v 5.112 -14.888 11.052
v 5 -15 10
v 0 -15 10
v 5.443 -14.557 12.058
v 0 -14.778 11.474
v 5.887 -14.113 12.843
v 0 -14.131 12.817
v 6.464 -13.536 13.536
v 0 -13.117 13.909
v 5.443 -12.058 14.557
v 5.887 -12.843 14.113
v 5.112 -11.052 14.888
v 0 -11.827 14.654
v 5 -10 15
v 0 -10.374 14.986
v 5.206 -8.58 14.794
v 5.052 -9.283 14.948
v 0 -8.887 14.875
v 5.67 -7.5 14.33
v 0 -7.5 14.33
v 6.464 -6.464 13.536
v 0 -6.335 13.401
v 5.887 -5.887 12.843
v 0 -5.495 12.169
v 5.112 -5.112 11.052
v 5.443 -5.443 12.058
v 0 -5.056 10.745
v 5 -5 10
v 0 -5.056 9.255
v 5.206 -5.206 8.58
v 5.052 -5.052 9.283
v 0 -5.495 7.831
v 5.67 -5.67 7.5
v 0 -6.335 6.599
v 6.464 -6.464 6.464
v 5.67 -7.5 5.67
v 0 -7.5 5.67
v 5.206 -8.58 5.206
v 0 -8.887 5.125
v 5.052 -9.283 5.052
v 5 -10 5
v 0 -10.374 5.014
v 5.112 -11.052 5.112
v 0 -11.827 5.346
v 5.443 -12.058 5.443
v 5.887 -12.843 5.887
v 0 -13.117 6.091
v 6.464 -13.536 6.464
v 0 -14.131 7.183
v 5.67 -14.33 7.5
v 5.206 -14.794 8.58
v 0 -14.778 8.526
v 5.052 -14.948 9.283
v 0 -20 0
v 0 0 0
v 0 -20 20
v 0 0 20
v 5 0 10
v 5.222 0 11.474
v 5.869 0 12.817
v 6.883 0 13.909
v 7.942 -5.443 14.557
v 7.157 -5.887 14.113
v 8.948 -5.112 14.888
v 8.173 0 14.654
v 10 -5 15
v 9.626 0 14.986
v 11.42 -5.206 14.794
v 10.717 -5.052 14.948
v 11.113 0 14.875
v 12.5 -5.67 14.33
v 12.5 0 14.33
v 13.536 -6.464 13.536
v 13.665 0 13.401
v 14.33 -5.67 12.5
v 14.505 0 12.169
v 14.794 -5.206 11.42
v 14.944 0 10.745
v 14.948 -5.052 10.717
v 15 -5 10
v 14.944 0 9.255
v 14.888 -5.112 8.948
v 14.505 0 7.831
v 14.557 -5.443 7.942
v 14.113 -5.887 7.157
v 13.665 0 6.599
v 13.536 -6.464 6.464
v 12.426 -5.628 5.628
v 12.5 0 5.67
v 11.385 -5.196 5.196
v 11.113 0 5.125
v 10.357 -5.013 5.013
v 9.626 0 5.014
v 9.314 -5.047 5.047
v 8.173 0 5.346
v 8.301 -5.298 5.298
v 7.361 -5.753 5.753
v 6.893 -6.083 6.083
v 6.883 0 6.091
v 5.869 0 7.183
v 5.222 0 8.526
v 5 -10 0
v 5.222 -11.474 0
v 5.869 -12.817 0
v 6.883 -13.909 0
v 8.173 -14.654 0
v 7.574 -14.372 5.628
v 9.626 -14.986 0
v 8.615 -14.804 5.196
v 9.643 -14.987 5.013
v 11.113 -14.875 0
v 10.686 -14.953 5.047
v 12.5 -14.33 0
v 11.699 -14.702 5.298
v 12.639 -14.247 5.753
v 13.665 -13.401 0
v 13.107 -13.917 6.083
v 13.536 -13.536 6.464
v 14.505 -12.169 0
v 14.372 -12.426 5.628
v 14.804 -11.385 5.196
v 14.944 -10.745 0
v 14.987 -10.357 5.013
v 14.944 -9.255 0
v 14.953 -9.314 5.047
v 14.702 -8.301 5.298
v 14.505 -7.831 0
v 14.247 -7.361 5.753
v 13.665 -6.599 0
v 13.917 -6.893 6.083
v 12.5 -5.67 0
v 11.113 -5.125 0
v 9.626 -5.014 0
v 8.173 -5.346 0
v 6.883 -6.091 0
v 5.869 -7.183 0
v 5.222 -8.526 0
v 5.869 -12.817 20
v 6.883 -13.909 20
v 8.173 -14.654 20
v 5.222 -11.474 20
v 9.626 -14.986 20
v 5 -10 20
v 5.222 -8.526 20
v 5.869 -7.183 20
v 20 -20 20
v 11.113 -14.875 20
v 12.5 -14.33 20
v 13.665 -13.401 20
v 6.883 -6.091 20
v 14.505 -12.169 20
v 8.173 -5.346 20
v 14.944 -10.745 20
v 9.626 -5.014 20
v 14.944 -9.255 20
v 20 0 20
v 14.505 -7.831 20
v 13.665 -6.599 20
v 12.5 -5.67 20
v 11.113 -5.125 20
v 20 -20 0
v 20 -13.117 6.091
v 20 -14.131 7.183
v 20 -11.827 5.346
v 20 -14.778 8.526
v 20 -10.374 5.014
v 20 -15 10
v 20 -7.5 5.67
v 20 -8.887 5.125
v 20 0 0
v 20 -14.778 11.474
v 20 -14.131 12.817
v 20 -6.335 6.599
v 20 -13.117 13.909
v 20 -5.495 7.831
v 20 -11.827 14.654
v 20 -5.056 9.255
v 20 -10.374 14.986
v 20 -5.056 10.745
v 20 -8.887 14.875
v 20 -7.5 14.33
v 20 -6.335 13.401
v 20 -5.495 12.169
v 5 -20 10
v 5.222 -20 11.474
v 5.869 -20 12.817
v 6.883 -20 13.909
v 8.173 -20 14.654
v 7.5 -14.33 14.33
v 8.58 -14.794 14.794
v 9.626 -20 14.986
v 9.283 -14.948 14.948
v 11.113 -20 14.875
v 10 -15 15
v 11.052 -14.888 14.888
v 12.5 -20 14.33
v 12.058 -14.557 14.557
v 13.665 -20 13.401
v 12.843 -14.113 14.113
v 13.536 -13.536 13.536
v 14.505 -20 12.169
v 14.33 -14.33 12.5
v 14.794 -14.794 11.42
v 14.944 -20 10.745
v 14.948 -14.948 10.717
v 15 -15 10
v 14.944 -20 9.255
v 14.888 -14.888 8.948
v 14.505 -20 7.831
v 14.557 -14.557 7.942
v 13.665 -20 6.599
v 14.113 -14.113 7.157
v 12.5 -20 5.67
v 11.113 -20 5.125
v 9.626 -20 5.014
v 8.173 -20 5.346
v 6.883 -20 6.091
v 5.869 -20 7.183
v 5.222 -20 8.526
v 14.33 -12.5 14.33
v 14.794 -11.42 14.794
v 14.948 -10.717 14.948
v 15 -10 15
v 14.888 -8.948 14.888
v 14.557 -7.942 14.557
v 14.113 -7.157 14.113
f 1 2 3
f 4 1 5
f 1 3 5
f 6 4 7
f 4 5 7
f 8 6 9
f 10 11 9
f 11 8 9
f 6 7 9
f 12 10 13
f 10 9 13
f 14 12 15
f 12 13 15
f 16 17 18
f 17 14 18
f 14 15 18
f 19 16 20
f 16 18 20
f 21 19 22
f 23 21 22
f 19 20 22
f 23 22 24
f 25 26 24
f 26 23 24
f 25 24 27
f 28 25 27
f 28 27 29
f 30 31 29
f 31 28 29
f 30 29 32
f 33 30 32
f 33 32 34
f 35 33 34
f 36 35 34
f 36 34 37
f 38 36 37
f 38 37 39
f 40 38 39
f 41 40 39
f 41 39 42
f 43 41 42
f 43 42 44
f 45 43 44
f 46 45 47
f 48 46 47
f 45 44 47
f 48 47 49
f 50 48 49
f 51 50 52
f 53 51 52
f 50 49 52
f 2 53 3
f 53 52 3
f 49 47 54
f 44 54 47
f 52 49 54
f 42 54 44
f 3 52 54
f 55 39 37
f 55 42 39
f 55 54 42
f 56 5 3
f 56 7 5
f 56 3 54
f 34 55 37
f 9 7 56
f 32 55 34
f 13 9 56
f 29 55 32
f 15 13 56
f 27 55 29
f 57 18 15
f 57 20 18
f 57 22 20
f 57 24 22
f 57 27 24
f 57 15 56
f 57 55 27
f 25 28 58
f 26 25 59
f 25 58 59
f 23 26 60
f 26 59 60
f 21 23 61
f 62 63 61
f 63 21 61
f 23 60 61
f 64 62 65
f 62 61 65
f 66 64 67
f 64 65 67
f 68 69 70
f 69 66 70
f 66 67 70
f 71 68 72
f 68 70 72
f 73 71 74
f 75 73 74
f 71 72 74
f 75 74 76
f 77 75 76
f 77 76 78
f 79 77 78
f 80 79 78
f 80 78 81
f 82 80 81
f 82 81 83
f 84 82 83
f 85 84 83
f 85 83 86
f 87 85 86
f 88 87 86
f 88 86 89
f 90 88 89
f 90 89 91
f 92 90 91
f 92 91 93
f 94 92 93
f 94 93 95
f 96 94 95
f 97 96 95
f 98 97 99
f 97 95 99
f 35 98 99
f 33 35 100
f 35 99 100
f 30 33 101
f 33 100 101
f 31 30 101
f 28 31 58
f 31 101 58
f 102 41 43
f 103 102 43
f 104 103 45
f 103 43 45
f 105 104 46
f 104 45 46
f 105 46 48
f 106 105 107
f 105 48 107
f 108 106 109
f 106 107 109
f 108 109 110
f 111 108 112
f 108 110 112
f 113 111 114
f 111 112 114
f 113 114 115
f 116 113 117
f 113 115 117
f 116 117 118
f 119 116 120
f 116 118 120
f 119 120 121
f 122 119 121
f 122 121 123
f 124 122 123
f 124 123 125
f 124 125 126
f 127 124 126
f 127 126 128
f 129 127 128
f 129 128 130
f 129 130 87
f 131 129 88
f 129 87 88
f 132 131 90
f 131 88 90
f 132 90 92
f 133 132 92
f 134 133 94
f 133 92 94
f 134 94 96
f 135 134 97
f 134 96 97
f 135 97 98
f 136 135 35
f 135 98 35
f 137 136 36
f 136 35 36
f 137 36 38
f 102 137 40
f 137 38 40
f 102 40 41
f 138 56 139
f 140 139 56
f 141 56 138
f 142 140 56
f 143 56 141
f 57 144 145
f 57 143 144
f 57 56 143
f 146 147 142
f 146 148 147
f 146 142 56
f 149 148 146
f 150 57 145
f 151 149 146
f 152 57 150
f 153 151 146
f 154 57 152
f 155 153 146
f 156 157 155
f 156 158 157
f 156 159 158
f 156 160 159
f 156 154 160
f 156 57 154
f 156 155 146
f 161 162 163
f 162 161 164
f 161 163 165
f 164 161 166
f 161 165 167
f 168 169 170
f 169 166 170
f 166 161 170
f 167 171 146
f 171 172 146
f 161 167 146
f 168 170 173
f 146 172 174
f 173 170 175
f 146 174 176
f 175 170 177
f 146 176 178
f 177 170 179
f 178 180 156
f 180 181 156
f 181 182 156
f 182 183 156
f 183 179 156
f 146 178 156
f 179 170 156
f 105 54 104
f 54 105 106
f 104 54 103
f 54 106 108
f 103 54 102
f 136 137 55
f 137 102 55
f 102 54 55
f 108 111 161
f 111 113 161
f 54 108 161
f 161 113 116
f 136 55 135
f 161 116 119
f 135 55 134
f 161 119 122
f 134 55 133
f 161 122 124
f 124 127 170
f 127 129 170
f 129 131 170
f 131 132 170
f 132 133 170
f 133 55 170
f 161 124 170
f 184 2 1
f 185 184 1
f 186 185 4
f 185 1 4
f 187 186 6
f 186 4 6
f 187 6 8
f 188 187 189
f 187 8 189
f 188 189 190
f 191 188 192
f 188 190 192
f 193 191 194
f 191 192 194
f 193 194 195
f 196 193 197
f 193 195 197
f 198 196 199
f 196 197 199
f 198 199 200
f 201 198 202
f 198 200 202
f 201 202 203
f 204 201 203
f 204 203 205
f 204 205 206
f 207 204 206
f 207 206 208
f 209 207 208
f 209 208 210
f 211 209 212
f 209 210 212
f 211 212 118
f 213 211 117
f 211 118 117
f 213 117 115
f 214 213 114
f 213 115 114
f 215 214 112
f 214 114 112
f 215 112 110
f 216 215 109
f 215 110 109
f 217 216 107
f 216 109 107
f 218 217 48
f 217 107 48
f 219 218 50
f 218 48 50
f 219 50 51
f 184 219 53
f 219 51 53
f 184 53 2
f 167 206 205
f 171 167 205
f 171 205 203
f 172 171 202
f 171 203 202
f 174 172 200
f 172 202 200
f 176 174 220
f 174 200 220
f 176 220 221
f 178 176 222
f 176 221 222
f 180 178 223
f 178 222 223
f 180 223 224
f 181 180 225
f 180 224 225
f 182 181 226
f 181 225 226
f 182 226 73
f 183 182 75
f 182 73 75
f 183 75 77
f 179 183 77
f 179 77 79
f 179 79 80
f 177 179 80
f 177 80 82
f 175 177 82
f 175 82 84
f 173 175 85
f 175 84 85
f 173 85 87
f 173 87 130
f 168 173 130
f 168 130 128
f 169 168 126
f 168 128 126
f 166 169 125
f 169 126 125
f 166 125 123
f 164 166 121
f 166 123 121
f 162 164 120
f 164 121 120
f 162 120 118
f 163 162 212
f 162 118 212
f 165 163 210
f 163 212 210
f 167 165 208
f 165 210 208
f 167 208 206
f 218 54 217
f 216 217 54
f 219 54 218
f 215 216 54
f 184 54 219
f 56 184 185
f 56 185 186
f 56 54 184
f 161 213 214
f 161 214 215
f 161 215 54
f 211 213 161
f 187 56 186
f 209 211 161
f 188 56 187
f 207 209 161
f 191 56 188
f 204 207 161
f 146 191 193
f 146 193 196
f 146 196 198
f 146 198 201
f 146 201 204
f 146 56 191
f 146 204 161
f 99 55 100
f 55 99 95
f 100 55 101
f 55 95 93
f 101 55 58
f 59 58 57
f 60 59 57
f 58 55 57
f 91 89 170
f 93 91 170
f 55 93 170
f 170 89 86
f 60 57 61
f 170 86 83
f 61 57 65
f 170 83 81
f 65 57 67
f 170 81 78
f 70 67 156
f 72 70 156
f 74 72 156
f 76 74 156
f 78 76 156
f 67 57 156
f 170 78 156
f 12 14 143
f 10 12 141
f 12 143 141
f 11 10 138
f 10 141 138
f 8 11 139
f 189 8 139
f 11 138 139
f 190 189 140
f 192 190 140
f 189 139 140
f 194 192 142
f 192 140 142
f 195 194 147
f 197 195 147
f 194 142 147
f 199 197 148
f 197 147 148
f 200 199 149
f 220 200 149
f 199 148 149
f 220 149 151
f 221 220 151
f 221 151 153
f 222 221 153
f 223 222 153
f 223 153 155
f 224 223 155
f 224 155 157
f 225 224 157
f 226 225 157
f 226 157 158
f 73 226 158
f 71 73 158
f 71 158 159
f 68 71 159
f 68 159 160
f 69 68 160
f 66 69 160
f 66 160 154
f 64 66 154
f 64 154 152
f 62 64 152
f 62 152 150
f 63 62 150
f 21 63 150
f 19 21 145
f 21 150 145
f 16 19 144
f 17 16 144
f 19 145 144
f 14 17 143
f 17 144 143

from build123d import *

# Parameters (mm, degrees)
F0_W     = 20
F0_H     = 20
F1_DEPTH = 20
F3_D     = 10
F5_D     = 10
F7_D     = 10


with BuildPart() as f1:
    # F0 (on Front) → F1 (new body)
    with BuildSketch(Plane.XZ):
        with Locations((10, 10)):
            Rectangle(F0_W, F0_H)
    extrude(amount=F1_DEPTH)

    # F3 (through all)
    with Locations(Plane(origin=(0, 0, 0), x_dir=(1, 0, 0), z_dir=(0, 0, -1))):
        with Locations((10, 10)):
            Hole(F3_D / 2)

    # F5 (through all)
    with Locations(Plane.XZ.offset(20)):
        with Locations((10, 10)):
            Hole(F5_D / 2)

    # F7 (through all)
    with Locations(Plane.YZ.offset(20)):
        with Locations((-10, 10)):
            Hole(F7_D / 2)


solid = f1.part
